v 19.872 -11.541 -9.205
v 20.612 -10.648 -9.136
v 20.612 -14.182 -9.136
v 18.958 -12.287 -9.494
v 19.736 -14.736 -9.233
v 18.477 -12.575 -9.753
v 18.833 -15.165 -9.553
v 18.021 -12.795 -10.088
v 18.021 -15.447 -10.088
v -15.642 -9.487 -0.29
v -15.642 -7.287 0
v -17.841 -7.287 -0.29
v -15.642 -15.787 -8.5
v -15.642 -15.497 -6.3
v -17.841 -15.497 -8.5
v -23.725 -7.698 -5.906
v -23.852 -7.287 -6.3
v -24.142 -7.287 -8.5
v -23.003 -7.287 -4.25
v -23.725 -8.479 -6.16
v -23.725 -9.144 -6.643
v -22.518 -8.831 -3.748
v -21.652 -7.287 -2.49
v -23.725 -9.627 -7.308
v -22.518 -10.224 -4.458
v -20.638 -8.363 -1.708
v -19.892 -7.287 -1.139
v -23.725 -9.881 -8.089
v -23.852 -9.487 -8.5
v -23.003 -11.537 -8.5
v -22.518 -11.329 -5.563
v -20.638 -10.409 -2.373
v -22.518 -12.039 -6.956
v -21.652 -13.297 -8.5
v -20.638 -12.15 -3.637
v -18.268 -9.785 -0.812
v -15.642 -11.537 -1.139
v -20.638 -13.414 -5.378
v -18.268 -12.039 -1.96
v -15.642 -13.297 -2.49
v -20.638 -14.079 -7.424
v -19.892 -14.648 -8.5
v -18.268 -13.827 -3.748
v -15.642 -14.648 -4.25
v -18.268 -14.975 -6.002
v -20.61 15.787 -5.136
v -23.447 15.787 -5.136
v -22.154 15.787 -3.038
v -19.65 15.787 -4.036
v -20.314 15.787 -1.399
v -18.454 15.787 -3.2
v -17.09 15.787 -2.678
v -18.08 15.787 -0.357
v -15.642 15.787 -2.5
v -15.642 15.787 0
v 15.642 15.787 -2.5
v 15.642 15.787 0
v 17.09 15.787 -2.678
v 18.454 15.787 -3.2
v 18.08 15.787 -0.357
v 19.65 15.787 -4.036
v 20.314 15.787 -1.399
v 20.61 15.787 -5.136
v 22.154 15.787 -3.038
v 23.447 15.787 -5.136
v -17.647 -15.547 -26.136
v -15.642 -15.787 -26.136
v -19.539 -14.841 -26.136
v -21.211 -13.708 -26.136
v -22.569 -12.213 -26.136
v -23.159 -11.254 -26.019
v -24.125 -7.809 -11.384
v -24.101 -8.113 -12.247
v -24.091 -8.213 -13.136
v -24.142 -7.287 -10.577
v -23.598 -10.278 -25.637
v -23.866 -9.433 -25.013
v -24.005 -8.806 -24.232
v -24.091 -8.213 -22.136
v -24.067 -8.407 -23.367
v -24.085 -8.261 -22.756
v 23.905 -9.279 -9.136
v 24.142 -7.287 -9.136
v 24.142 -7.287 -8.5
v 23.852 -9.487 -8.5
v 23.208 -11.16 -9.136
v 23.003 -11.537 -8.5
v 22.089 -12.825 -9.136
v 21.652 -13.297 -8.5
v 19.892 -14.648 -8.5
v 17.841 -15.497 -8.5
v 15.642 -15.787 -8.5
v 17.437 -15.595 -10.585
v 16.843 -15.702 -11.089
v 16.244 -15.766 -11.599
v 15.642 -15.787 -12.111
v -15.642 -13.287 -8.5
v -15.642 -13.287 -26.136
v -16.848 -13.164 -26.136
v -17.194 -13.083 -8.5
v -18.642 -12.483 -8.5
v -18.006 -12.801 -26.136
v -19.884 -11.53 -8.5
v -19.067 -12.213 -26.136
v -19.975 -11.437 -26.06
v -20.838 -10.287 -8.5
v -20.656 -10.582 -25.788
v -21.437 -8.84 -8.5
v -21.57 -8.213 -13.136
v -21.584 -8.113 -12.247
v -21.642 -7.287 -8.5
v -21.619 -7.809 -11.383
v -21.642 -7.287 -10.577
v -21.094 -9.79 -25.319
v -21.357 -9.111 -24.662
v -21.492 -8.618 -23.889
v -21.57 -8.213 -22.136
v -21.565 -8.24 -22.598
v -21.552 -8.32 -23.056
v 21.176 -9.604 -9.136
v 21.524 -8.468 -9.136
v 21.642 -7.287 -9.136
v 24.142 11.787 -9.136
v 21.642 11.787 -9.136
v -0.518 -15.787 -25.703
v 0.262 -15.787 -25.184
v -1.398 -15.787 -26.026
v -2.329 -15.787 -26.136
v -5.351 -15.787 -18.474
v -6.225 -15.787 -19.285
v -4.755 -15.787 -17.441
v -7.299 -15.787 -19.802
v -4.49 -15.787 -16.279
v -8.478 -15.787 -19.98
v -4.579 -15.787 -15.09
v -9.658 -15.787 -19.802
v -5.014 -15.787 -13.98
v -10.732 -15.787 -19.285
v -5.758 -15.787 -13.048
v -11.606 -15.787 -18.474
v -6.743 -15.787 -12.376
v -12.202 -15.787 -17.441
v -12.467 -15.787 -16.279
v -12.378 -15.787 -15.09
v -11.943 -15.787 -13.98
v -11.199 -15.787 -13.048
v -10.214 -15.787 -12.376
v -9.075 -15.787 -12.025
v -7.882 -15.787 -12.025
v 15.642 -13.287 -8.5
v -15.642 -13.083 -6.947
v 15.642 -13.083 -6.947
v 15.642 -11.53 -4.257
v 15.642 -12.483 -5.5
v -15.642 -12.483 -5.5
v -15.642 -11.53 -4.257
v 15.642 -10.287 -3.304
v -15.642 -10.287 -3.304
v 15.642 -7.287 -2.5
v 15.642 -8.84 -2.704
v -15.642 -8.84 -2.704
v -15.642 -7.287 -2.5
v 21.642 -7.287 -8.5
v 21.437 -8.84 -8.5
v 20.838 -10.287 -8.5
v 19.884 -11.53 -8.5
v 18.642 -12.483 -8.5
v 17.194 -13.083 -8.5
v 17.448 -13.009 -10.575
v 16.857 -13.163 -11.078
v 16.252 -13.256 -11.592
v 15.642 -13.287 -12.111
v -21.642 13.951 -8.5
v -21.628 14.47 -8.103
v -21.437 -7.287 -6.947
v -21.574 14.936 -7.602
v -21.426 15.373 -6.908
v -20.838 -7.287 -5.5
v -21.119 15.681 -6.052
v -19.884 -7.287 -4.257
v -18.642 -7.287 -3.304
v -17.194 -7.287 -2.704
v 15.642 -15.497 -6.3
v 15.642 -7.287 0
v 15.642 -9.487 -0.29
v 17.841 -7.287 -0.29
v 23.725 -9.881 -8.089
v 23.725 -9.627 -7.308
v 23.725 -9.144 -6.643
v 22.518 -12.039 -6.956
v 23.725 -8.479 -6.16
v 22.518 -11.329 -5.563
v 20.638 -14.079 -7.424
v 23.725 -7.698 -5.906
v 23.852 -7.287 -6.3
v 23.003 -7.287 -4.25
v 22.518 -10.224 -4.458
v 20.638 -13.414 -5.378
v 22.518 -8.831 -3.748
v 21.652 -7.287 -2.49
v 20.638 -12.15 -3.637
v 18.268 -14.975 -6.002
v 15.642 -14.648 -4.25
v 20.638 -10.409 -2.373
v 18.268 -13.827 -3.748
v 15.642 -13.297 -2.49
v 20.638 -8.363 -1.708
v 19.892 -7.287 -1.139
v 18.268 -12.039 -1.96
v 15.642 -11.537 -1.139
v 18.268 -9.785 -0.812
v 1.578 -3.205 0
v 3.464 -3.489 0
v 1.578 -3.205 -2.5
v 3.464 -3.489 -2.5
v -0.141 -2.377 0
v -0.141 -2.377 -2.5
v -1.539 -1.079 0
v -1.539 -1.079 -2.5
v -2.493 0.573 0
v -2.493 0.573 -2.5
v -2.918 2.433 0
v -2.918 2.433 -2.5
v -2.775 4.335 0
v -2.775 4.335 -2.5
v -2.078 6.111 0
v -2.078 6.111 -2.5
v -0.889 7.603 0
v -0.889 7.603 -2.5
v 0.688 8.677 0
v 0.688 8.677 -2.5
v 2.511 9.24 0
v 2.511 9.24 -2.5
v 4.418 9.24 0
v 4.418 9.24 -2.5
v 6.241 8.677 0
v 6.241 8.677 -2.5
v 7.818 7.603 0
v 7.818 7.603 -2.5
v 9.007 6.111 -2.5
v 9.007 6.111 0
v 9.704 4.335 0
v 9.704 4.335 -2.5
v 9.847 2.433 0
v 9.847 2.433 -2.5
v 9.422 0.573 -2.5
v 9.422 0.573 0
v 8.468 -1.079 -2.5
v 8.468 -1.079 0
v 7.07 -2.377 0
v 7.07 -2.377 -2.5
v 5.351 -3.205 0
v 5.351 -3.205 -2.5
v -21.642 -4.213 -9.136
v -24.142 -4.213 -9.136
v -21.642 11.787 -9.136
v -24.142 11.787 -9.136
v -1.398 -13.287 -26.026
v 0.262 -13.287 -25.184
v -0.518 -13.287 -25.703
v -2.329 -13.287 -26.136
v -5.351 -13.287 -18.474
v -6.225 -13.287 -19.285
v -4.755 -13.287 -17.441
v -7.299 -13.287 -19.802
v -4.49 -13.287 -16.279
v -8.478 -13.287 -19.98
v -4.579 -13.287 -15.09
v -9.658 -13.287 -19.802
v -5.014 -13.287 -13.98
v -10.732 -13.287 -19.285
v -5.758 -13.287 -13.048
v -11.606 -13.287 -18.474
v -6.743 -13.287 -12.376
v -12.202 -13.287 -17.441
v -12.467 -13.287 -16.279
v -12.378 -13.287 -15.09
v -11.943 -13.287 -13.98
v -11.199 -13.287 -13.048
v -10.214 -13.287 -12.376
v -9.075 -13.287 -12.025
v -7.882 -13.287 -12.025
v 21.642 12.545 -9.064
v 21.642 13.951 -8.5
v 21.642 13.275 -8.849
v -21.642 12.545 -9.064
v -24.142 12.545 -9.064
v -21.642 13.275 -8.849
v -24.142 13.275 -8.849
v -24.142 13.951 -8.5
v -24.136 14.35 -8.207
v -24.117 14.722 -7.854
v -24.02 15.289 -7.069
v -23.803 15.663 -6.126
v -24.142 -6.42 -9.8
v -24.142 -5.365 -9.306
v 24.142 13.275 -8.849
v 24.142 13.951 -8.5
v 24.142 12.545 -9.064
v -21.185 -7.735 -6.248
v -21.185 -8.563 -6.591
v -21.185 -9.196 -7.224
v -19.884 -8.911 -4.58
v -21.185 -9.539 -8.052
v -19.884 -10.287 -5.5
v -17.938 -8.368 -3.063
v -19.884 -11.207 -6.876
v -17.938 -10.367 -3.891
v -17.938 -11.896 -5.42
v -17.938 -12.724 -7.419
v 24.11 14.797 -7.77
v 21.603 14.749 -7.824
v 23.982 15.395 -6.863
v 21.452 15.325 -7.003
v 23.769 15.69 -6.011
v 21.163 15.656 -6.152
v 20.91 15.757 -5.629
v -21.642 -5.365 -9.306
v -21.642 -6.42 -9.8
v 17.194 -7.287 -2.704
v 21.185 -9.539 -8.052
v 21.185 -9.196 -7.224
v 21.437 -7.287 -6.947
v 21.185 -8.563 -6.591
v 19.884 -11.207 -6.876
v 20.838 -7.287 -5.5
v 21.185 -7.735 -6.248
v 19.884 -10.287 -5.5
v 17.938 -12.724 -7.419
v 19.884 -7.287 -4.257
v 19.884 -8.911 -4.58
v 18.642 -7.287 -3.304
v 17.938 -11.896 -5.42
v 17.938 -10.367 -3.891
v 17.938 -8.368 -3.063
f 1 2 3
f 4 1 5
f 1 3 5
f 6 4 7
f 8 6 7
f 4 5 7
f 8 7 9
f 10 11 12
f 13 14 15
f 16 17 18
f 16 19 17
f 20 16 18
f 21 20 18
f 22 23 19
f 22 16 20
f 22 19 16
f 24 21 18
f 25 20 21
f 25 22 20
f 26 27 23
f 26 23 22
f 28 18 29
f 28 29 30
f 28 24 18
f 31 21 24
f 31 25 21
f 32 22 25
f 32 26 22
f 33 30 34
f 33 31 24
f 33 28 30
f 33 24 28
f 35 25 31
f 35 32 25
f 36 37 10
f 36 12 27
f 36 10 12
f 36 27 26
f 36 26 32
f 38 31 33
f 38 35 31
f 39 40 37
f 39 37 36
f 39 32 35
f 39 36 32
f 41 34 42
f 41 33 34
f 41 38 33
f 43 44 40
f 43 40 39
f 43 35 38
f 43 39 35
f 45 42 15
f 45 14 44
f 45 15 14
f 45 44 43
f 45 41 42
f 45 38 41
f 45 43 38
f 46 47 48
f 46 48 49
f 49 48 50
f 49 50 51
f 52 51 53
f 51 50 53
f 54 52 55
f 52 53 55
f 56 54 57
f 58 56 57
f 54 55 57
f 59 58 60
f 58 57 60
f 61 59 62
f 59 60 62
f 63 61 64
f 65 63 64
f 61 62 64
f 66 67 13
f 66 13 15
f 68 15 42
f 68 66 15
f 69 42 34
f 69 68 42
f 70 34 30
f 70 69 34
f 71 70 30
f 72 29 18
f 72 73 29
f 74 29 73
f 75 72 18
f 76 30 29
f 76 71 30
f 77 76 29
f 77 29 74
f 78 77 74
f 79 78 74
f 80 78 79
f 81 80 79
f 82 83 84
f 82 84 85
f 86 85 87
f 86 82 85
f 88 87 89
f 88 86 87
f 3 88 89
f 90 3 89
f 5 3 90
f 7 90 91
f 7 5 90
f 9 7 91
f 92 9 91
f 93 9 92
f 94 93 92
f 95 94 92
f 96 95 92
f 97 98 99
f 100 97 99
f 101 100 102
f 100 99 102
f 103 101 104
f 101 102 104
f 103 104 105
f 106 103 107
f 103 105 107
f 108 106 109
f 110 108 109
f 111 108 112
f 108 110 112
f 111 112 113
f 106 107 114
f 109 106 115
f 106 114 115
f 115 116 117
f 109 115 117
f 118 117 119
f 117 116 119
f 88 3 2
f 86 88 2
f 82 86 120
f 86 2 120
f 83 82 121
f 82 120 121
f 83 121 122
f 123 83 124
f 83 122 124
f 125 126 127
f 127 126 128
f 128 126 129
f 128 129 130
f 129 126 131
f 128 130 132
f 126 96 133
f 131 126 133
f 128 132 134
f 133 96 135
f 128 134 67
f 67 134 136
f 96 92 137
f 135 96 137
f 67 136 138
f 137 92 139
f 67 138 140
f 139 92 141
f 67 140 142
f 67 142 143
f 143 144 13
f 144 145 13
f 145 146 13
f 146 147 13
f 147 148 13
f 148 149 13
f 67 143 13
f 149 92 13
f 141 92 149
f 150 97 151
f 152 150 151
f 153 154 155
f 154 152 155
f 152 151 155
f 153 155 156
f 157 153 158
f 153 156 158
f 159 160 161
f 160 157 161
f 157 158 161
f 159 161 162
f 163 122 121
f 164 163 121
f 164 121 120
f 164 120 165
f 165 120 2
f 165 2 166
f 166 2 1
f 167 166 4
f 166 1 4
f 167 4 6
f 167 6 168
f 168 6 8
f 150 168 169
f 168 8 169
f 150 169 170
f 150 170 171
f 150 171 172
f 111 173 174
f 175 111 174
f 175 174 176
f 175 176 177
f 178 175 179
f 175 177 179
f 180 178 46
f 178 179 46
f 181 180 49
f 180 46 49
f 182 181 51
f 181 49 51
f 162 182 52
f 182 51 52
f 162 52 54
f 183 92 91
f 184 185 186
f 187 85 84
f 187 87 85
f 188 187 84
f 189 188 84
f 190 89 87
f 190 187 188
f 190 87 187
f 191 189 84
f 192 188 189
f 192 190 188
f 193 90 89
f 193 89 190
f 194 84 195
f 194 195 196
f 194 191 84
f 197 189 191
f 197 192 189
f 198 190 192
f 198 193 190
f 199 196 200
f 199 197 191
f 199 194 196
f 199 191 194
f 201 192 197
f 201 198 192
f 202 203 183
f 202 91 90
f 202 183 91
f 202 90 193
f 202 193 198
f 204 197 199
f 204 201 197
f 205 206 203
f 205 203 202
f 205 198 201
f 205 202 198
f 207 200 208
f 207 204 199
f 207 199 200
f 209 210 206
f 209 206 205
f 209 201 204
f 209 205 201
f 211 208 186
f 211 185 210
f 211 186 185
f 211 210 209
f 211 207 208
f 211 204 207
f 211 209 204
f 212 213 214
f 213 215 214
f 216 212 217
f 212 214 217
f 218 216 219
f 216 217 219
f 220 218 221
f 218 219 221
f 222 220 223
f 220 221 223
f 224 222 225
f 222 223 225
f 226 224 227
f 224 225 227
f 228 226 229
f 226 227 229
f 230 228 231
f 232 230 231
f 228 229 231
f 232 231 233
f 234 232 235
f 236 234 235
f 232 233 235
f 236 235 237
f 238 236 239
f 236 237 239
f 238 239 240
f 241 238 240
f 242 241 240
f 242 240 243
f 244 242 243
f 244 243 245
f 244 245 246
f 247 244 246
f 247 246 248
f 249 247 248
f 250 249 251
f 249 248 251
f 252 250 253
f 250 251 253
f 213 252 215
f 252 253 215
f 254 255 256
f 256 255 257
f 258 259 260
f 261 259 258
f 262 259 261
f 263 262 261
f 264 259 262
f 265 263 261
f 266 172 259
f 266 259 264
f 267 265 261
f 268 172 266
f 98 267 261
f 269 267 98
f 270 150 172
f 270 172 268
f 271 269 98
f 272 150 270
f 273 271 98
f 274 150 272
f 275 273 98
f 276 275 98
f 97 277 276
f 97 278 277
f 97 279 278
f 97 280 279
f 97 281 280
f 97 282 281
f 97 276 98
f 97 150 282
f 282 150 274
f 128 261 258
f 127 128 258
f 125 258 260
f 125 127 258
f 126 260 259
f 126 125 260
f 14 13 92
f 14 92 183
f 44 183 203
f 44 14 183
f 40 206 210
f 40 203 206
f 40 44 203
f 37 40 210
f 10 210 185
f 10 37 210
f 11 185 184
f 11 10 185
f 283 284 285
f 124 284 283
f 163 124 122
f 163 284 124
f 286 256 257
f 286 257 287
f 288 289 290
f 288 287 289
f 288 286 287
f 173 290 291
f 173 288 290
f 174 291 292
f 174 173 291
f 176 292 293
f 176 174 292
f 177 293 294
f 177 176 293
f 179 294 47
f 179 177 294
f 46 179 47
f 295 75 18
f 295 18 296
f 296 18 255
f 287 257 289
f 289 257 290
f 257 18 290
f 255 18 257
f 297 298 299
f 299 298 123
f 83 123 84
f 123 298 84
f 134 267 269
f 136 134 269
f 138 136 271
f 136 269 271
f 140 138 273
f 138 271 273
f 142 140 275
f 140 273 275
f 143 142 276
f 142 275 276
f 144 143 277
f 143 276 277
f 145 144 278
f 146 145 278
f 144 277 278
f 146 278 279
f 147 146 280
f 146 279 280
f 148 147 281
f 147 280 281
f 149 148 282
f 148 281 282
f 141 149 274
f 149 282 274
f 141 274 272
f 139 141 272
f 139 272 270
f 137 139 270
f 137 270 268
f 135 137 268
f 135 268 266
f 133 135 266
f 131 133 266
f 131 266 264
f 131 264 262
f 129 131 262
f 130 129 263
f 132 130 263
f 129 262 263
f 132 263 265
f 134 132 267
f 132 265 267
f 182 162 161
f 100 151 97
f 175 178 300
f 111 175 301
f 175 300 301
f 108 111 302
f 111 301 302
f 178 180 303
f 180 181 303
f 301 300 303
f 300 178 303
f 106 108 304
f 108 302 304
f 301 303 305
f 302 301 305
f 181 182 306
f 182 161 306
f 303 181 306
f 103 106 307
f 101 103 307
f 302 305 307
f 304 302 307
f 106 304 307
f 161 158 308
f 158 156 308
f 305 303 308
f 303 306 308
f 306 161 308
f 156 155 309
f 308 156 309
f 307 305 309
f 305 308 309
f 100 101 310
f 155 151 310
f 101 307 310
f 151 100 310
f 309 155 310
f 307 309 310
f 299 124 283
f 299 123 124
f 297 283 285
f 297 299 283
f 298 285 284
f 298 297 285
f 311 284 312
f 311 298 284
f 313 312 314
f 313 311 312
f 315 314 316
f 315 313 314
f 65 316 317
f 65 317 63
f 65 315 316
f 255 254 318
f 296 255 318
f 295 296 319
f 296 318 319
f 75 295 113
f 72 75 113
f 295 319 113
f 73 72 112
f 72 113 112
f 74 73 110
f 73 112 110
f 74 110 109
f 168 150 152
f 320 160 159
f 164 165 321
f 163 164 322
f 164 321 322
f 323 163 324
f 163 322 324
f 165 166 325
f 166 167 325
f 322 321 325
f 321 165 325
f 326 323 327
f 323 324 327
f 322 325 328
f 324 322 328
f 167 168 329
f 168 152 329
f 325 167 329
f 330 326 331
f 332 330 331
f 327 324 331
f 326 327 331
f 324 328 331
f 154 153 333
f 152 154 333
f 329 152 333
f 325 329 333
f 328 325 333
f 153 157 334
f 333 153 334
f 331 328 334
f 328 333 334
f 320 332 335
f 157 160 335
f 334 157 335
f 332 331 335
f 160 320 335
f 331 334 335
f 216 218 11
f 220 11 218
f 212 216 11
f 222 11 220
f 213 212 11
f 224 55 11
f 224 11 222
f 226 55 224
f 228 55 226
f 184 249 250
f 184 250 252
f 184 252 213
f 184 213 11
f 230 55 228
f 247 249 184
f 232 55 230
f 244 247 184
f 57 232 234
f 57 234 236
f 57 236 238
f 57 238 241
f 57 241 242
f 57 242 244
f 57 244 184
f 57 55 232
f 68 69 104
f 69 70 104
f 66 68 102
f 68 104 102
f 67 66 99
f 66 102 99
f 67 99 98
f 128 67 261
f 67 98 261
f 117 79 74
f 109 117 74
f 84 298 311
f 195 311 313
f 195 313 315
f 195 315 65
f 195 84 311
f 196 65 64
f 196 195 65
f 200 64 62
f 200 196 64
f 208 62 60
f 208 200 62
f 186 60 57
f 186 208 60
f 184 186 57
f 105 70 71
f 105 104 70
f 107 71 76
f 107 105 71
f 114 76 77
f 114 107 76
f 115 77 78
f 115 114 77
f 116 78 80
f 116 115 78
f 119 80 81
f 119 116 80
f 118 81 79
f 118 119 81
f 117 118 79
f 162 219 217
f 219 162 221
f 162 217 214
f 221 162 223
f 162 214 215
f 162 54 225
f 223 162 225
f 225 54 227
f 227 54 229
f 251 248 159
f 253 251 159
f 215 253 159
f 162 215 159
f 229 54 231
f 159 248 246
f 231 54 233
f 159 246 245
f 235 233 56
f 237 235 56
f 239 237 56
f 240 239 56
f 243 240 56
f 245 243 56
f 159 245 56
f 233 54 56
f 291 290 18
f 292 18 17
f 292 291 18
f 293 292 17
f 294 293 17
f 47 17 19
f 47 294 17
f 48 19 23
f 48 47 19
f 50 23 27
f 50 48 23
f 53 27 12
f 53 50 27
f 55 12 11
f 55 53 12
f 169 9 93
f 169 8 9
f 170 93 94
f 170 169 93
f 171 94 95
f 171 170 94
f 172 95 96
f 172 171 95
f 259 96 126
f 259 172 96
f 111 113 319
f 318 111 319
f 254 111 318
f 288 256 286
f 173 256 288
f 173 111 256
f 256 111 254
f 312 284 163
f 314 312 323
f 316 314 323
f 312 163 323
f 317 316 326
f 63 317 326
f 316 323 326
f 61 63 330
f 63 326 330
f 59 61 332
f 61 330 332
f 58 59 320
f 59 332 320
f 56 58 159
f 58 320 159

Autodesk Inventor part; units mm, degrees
ref_plane "YZ Plane" through (0, 0, 0) normal (1, 0, 0) x (0, 1, 0)
ref_plane "XZ Plane" through (0, 0, 0) normal (0, 1, 0) x (-1, 0, 0)
ref_plane "XY Plane" through (0, 0, 0) normal (0, 0, 1) x (1, 0, 0)
sketch "Sketch1" plane through (0, 0, 0) normal (0, 0, 1) x (1, 0, 0)
  line L0 (-24.1415, 15.787) -> (24.1415, 15.787)
  line L1 (24.1415, 15.787) -> (24.1415, -15.787)
  line L2 (24.1415, -15.787) -> (-24.1415, -15.787)
  line L3 (-24.1415, -15.787) -> (-24.1415, 15.787)
  point P0 (0, 0)
  dimension "d0" = 31.574
  dimension "d1" = 48.283
  dimension "d2" = 24.1415
  dimension "d3" = 15.787
extrude "Extrusion1" add sketch "Sketch1" against normal blind 26.136
fillet "Fillet1" radius 8.5 5 edges at (0, -15.787, 0) (24.1415, 0, 0) (-24.1415, 0, 0) (-24.1415, -15.787, -13.068) (24.1415, -15.787, -13.068)
shell "Shell1" thickness 2.5 removed faces 2 at (5.2138, 15.787, -17.424) at (-5.2138, 5.2623, -26.136)
sketch "Sketch2" plane through (-24.1415, -7.287, -8.5) normal (-1, 0, 0) x (0, 0, 1)
  line L0 (0, 23.074) -> (-17.636, 23.074) projected
  line L1 (-17.636, 23.074) -> (-17.636, 0) projected
  line L2 (-17.636, -0.926) -> (-0.636, -0.926)
  line L3 (-0.636, -0.926) -> (-0.636, 23.074)
  line L4 (-0.636, 23.074) -> (-17.636, 23.074)
  line L5 (-17.636, 23.074) -> (-17.636, -0.926)
  point P0 (8.5, 7.287)
  dimension "d8" = 17
  dimension "d9" = 24
extrude "Extrusion2" cut sketch "Sketch2" against normal through all
sketch "Sketch3" plane through (-15.6415, 15.787, 0) normal (0, 1, 0) x (1, 0, 0)
  line L0 (39.783, 8.5) -> (39.783, 9.136) projected
  line L1 (39.783, 9.136) -> (34.783, 9.136)
  line L2 (34.783, 9.136) -> (14.783, 26.136)
  line L3 (0, 26.136) -> (31.283, 26.136) projected
  line L4 (39.783, 9.136) -> (39.783, 26.136)
  line L5 (39.783, 26.136) -> (14.783, 26.136)
  point P0 (15.6415, 0)
  dimension "d12" = 5
  dimension "d13" = 20
extrude "Extrusion3" cut sketch "Sketch3" against normal through all
fillet "Fillet2" radius 4 6 edges at (-22.8303, -8.213, -26.136) (19.1415, -13.5967, -9.136) (-22.8303, -8.213, -9.136) (-22.8915, 15.787, -9.136) (22.8915, 15.787, -9.136) (-0.8585, -14.537, -26.136)
sketch "Sketch4" plane through (0, 0, 0) normal (0, 0, 1) x (1, 0, 0)
  line L0 (0.2618, -15.787) -> (-2.3288, -15.787) projected
  line L1 (0.2618, -15.787) -> (15.6415, -15.787) projected
  line L2 (-15.6415, -15.787) -> (15.6415, -15.787) projected
  line L3 (-15.6415, -15.787) -> (-2.3288, -15.787) projected
  line L4 (-24.1415, 11.787) -> (-24.1415, 13.9511) projected
  line L5 (-24.1415, 11.787) -> (-24.1415, -4.213) projected
  line L6 (-24.1415, -4.213) -> (-24.1415, -7.287) projected
  line L7 (-24.1415, 13.9511) -> (-24.1415, -7.287) projected
  point P0 (0, 0)
  point P1 (3.4645, 2.911)
  dimension "d17" = 27.606
  dimension "d18" = 18.698
hole "Hole1" at (3.4645, 2.911, 0) direction (0, 0, -1) diameter 12.8 end through all
sketch "Sketch5" plane through (-15.6415, -15.787, -8.5) normal (0, -1, 0) x (1, 0, 0)
  line L0 (-8.5, -2.0766) -> (-8.5, -0.636) projected
  line L1 (12.706, 8.5) -> (25.506, 8.5) projected
  line L2 (0, 8.5) -> (31.283, 8.5) projected
  line L3 (31.283, 8.5) -> (0, 8.5) projected
  point P0 (15.6415, 8.5)
  point P1 (7.163, -7.48)
  dimension "d26" = 15.663
  dimension "d27" = 15.98
hole "Hole2" at (-8.4785, -15.787, -15.98) direction (0, 1, 0) diameter 8 end through all
equation "\"d2\" = 0.5 * d1"
equation "\"d3\" = 0.5 * d0"
properties part number "314-08" material "Steel"
